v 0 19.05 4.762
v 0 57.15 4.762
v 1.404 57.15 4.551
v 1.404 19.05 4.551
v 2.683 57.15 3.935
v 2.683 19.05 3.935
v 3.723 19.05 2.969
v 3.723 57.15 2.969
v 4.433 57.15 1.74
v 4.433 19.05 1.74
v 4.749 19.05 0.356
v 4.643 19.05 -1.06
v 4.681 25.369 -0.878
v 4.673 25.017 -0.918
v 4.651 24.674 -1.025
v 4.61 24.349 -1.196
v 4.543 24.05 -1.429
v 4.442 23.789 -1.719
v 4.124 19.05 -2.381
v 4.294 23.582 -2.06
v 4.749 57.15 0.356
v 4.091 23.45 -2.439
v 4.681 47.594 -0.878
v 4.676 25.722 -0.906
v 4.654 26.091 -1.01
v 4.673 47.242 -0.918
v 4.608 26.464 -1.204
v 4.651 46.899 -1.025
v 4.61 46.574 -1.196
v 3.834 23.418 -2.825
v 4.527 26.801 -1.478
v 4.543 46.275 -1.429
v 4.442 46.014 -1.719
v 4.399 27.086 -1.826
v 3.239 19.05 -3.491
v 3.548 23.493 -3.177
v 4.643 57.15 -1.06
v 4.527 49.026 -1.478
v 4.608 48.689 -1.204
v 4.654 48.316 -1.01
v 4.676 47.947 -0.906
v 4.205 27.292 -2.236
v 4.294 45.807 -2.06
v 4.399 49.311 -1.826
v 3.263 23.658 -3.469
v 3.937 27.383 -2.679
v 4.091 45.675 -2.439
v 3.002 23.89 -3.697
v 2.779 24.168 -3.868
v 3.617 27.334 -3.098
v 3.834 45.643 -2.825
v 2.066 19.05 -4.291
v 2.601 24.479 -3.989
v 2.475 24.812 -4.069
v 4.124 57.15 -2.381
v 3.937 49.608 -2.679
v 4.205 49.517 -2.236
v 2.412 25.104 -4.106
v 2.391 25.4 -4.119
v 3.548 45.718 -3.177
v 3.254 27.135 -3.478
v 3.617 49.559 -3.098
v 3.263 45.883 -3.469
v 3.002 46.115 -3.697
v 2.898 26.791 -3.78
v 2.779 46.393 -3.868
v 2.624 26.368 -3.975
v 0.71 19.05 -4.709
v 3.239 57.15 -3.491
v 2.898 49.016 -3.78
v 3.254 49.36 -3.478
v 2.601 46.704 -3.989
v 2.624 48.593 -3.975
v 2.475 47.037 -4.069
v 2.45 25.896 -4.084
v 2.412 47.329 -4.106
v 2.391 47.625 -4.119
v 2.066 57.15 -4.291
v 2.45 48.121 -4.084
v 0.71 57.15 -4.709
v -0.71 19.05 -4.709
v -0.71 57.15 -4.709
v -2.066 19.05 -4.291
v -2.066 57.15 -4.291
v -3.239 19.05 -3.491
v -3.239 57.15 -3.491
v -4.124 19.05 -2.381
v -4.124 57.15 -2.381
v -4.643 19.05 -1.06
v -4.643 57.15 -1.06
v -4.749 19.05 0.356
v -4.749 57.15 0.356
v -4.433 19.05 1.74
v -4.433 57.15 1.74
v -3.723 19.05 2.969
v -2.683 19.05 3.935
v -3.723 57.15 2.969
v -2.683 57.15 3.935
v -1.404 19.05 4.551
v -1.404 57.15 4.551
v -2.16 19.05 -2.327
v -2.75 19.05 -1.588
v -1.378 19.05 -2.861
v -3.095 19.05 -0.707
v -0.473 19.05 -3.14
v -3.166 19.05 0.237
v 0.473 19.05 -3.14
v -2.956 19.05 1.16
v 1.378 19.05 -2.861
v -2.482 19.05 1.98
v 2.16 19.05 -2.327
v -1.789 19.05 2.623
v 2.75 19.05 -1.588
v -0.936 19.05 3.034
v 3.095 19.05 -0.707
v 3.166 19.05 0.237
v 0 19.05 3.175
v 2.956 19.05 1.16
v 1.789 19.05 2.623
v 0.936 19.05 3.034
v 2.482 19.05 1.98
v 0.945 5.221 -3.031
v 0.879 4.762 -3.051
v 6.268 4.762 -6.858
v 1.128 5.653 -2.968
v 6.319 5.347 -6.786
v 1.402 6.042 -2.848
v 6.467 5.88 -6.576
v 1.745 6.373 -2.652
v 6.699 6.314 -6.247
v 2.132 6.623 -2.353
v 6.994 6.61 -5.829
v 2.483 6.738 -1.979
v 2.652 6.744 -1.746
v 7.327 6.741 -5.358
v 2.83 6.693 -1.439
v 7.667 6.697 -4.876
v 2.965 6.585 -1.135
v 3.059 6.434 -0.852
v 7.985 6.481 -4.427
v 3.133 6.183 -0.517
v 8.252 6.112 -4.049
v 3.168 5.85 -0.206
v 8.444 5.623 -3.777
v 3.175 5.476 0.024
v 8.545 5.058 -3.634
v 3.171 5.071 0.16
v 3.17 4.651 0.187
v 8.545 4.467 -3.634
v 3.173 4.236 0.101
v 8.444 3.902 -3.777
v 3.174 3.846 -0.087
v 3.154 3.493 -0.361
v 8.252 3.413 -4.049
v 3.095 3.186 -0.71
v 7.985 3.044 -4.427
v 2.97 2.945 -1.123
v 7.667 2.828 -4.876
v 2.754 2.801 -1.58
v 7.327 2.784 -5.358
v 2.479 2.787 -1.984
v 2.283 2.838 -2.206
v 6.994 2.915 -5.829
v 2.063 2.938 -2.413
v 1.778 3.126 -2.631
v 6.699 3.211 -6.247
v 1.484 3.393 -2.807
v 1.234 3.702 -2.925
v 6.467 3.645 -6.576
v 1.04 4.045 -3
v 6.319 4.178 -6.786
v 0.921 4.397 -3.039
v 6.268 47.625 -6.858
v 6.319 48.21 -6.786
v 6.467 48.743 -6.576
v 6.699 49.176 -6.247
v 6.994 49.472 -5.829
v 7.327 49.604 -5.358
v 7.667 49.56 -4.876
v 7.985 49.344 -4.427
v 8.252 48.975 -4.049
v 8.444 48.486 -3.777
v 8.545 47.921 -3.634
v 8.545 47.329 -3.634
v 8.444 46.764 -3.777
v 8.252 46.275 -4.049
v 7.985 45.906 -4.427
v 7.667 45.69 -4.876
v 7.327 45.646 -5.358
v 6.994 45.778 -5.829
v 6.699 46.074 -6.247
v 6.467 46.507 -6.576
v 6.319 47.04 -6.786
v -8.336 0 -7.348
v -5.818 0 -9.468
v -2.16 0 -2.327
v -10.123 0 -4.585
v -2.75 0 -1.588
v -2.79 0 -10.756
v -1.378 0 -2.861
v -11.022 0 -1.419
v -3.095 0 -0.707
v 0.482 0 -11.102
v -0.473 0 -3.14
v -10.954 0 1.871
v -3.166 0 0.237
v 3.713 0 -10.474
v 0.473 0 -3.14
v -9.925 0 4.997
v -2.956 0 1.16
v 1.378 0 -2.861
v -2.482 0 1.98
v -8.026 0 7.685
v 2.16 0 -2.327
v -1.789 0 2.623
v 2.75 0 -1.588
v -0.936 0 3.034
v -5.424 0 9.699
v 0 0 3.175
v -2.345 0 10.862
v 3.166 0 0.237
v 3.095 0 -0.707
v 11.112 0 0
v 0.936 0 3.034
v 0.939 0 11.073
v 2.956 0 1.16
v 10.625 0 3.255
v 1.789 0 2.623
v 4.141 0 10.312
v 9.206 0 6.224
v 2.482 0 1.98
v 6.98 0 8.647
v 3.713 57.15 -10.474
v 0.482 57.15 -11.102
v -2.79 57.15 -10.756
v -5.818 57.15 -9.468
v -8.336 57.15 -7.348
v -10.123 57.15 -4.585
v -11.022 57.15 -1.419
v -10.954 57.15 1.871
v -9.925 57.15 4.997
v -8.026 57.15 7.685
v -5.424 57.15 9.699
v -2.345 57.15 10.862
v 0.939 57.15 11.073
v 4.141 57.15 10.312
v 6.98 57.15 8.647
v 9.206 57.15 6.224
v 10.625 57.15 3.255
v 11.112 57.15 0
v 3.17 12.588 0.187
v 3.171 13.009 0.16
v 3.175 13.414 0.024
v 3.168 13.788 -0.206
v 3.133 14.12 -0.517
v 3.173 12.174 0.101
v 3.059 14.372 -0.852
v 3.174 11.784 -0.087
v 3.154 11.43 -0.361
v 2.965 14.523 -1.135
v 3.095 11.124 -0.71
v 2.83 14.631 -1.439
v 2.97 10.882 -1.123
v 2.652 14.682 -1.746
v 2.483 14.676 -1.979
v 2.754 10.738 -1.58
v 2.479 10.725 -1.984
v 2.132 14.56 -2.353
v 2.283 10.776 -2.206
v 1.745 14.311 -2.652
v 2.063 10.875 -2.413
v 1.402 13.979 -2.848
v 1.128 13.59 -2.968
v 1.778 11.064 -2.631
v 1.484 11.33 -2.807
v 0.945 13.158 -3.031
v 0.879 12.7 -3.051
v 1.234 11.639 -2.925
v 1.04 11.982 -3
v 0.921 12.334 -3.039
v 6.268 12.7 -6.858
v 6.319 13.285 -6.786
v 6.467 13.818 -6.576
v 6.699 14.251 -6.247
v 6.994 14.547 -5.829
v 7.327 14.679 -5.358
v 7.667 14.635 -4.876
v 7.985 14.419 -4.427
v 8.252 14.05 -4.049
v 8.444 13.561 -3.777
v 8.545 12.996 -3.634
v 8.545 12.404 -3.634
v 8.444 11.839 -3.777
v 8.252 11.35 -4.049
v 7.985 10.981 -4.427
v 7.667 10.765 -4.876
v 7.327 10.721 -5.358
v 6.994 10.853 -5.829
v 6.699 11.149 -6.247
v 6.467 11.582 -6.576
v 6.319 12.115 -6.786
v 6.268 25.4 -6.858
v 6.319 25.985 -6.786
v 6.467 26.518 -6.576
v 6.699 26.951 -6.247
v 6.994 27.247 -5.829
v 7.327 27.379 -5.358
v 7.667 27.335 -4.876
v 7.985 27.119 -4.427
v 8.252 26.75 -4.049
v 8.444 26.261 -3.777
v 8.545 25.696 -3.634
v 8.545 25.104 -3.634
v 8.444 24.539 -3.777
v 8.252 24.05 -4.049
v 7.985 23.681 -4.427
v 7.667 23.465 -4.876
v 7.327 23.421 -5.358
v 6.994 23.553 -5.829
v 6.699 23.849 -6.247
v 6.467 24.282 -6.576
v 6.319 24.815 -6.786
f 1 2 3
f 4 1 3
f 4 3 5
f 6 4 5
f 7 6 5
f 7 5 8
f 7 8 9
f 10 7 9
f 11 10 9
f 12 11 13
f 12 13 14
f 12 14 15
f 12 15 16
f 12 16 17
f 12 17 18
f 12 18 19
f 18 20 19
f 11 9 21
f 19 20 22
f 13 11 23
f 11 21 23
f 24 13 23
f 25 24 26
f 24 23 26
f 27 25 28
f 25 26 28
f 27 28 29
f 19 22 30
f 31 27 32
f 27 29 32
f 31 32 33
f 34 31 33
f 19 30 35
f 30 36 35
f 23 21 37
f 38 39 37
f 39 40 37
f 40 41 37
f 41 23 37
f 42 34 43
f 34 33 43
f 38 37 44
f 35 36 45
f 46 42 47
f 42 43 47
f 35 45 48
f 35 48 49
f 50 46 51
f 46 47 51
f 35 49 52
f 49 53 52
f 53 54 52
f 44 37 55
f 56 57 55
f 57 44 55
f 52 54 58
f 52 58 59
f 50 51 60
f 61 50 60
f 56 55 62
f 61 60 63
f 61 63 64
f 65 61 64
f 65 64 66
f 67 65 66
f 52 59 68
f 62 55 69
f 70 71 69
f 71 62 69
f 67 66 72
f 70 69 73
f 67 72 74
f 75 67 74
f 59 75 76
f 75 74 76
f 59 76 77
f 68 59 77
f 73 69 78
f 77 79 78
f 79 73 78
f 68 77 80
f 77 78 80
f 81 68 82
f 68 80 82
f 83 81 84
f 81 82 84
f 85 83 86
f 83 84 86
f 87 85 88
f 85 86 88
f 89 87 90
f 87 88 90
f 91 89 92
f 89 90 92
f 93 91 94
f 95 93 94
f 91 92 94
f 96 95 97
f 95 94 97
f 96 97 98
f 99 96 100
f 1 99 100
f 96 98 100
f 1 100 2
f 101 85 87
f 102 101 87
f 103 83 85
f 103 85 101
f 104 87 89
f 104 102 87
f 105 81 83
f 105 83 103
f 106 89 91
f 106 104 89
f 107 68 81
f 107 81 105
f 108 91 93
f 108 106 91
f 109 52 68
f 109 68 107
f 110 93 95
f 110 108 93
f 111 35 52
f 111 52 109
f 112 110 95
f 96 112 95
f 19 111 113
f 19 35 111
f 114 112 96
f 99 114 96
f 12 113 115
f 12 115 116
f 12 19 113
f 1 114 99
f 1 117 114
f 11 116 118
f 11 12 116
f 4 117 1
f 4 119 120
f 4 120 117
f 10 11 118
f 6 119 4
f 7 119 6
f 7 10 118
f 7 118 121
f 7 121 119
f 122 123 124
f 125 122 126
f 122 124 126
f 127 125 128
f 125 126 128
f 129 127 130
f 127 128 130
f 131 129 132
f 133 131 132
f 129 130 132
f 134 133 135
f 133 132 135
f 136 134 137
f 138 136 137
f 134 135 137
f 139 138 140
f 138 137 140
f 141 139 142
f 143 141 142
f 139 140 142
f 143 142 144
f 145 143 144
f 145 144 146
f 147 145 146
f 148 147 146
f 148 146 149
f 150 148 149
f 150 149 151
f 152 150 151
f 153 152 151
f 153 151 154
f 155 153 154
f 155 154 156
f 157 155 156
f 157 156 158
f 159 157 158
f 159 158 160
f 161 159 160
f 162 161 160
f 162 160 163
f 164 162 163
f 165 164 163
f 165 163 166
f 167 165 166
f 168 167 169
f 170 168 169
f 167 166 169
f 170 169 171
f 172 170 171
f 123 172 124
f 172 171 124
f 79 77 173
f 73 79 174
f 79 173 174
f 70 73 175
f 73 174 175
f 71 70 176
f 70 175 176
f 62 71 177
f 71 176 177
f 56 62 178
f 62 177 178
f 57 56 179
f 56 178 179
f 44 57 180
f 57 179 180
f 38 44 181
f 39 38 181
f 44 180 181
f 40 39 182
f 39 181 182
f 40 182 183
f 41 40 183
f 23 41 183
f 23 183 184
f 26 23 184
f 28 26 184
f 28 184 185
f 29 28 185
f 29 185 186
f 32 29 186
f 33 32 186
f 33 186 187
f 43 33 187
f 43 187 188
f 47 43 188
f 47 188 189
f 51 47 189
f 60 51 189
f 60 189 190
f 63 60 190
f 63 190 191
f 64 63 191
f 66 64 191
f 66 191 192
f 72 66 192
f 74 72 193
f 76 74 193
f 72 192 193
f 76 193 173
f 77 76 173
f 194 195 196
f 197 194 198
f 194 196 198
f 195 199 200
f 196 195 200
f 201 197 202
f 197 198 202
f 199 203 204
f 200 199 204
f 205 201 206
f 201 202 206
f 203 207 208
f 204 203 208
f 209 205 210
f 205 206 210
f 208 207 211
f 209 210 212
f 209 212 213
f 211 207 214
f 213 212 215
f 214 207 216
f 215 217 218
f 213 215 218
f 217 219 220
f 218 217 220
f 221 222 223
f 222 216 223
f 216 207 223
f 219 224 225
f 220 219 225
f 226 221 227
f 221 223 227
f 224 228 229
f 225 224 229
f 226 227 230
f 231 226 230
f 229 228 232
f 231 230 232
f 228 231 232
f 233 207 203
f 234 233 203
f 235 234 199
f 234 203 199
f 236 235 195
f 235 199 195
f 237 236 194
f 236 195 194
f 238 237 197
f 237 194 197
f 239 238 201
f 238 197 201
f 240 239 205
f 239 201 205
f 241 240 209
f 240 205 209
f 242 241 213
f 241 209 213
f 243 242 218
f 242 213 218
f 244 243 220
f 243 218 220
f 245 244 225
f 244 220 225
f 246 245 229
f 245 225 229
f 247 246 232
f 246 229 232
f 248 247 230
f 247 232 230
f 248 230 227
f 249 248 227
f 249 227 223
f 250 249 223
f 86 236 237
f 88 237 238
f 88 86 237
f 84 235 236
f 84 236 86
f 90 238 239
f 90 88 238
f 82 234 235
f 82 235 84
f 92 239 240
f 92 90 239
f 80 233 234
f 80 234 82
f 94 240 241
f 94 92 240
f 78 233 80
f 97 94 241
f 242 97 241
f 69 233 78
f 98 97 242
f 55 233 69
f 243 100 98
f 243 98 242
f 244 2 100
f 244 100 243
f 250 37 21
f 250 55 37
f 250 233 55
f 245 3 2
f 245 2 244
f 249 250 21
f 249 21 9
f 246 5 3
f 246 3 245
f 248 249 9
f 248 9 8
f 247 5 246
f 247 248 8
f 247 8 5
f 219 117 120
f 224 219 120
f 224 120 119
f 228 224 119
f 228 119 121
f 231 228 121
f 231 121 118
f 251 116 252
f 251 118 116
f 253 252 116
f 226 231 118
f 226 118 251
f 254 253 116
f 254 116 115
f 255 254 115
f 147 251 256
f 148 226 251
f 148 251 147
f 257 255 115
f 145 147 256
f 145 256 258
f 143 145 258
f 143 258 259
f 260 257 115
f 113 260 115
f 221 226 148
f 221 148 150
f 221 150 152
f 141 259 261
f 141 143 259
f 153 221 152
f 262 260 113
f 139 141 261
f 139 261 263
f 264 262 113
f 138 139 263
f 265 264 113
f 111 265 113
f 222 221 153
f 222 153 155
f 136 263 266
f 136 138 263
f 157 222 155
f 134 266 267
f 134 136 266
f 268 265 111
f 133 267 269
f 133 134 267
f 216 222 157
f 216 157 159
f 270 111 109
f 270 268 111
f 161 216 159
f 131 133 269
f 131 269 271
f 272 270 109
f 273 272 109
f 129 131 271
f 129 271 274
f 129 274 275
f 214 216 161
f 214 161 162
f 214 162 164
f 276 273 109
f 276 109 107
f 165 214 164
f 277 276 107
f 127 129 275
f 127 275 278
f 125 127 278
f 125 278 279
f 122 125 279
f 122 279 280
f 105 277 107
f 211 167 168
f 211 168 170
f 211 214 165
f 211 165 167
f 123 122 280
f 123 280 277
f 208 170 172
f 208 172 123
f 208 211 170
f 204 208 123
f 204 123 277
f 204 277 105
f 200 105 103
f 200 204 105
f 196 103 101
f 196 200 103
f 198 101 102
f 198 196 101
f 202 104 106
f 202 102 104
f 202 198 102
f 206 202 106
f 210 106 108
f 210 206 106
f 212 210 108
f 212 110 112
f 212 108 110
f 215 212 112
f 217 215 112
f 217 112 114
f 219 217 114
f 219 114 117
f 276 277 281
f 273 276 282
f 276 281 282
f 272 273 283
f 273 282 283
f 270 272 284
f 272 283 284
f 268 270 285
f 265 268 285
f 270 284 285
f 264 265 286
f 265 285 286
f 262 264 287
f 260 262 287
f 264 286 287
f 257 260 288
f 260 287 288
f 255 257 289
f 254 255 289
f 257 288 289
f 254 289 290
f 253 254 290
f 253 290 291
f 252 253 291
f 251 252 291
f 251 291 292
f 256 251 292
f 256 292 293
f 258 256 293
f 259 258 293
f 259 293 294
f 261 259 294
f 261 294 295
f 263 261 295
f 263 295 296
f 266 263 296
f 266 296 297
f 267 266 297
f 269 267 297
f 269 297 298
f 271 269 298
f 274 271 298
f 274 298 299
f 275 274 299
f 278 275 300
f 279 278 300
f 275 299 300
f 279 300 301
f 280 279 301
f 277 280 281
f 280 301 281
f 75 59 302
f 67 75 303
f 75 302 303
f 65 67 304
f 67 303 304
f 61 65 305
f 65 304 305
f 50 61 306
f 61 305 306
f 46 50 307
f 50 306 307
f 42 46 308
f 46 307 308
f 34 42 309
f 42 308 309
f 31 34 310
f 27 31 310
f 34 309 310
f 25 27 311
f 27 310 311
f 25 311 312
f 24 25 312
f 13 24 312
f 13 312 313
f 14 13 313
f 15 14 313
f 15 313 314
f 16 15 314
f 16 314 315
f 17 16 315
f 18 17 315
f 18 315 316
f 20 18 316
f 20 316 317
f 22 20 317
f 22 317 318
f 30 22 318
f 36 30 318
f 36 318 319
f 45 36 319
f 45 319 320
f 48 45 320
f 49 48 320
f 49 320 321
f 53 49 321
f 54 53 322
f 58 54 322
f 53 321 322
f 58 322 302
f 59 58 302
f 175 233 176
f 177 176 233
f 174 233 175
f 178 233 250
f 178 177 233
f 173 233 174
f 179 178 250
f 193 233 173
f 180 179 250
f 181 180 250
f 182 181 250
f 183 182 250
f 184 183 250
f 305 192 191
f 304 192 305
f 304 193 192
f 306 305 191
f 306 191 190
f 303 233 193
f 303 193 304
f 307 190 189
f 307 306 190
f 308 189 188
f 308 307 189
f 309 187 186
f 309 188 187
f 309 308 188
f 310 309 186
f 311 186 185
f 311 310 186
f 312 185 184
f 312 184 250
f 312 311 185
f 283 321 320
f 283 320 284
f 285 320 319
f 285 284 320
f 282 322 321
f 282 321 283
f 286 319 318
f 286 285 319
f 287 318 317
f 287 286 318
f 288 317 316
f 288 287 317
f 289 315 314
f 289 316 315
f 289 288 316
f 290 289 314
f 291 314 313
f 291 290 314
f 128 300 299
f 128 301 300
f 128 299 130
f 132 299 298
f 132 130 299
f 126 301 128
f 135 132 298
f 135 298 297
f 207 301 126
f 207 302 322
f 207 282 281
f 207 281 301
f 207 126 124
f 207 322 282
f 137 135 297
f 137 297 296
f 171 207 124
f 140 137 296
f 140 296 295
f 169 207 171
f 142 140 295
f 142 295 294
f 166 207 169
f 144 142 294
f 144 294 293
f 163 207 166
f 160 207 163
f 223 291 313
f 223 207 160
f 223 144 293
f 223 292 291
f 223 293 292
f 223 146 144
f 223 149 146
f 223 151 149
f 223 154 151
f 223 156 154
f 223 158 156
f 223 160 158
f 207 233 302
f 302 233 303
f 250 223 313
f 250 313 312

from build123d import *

# Parameters (mm, degrees)
SKETCH1_R               = 11.1125
SKETCH1_R_2             = 3.175
BOSS_EXTRUDE1_DEPTH     = 57.15
CUT_EXTRUDE2_DEPTH      = 60.271391181
CUT_EXTRUDE2_DEPTH_BACK = 57.15
SKETCH3_R               = 4.7625
CUT_EXTRUDE3_DEPTH      = 38.1
CUT_EXTRUDE4_REACH      = 64.262
SKETCH4_R               = 1.984375


with BuildPart() as part:
    # Sketch1 → Boss-Extrude1 (new body)
    with BuildSketch(Plane(origin=(0, 0, 0), x_dir=(1, 0, 0), z_dir=(0, 1, 0))):
        with Locations(Location((0, 0, 0), (0, 0, 270))):
            Circle(SKETCH1_R)
        with Locations(Location((0, 0, 0), (0, 0, 270))):
            Circle(SKETCH1_R_2, mode=Mode.SUBTRACT)
    extrude(amount=BOSS_EXTRUDE1_DEPTH)

    # Sketch2 → Cut-Extrude2 (cut, two sides: drawn at the far end of the back side and taken through both)
    with BuildSketch(Plane(origin=(0, 57.15, 0), x_dir=(1, 0, 0), z_dir=(0, 1, 0)).offset(-CUT_EXTRUDE2_DEPTH_BACK)):
        Polygon((-32.277943168, 61.417010445), (3.712797685, 10.473909948), (11.1125, 0), (47.103240854, -50.943100497), (148.989441847, 21.03838121), (69.608257825, 133.398492152), align=None)
    extrude(amount=CUT_EXTRUDE2_DEPTH + CUT_EXTRUDE2_DEPTH_BACK, mode=Mode.SUBTRACT)

    # Sketch3 → Cut-Extrude3 (cut)
    with BuildSketch(Plane(origin=(0, 57.15, 0), x_dir=(1, 0, 0), z_dir=(0, 1, 0))):
        with Locations(Location((0, 0, 0), (0, 0, 270))):
            Circle(SKETCH3_R)
    extrude(amount=-CUT_EXTRUDE3_DEPTH, mode=Mode.SUBTRACT)

    # Sketch4 → Cut-Extrude4 (cut, up to next)
    with BuildSketch(Plane(origin=(7.412648843, 0, -5.236954974), x_dir=(-0.5770138525497868, 0, -0.8167343594863956), z_dir=(0.8167343594863956, 0, -0.5770138525497868)), mode=Mode.PRIVATE) as cut_extrude4_sk1:
        with Locations((0, 47.625)):
            Circle(SKETCH4_R)
    cut_extrude4_tool1 = extrude(cut_extrude4_sk1.sketch, amount=-CUT_EXTRUDE4_REACH, mode=Mode.PRIVATE) & part.part
    # Sketch4 → Cut-Extrude4 (cut, up to next)
    with BuildSketch(Plane(origin=(7.412648843, 0, -5.236954974), x_dir=(-0.5770138525497868, 0, -0.8167343594863956), z_dir=(0.8167343594863956, 0, -0.5770138525497868)), mode=Mode.PRIVATE) as cut_extrude4_sk2:
        with Locations((0, 25.4)):
            Circle(SKETCH4_R)
    cut_extrude4_tool2 = extrude(cut_extrude4_sk2.sketch, amount=-CUT_EXTRUDE4_REACH, mode=Mode.PRIVATE) & part.part
    # Sketch4 → Cut-Extrude4 (cut, up to next)
    with BuildSketch(Plane(origin=(7.412648843, 0, -5.236954974), x_dir=(-0.5770138525497868, 0, -0.8167343594863956), z_dir=(0.8167343594863956, 0, -0.5770138525497868)), mode=Mode.PRIVATE) as cut_extrude4_sk3:
        with Locations((0, 12.7)):
            Circle(SKETCH4_R)
    cut_extrude4_tool3 = extrude(cut_extrude4_sk3.sketch, amount=-CUT_EXTRUDE4_REACH, mode=Mode.PRIVATE) & part.part
    # Sketch4 → Cut-Extrude4 (cut, up to next)
    with BuildSketch(Plane(origin=(7.412648843, 0, -5.236954974), x_dir=(-0.5770138525497868, 0, -0.8167343594863956), z_dir=(0.8167343594863956, 0, -0.5770138525497868)), mode=Mode.PRIVATE) as cut_extrude4_sk4:
        with Locations((0, 4.7625)):
            Circle(SKETCH4_R)
    cut_extrude4_tool4 = extrude(cut_extrude4_sk4.sketch, amount=-CUT_EXTRUDE4_REACH, mode=Mode.PRIVATE) & part.part
    add(cut_extrude4_tool1.solids().sort_by_distance((7.412649, 47.625, -5.236955))[0], mode=Mode.SUBTRACT)
    add(cut_extrude4_tool2.solids().sort_by_distance((7.412649, 25.4, -5.236955))[0], mode=Mode.SUBTRACT)
    add(cut_extrude4_tool3.solids().sort_by_distance((7.412649, 12.7, -5.236955))[0], mode=Mode.SUBTRACT)
    add(cut_extrude4_tool4.solids().sort_by_distance((7.412649, 4.7625, -5.236955))[0], mode=Mode.SUBTRACT)


solid = part.part
